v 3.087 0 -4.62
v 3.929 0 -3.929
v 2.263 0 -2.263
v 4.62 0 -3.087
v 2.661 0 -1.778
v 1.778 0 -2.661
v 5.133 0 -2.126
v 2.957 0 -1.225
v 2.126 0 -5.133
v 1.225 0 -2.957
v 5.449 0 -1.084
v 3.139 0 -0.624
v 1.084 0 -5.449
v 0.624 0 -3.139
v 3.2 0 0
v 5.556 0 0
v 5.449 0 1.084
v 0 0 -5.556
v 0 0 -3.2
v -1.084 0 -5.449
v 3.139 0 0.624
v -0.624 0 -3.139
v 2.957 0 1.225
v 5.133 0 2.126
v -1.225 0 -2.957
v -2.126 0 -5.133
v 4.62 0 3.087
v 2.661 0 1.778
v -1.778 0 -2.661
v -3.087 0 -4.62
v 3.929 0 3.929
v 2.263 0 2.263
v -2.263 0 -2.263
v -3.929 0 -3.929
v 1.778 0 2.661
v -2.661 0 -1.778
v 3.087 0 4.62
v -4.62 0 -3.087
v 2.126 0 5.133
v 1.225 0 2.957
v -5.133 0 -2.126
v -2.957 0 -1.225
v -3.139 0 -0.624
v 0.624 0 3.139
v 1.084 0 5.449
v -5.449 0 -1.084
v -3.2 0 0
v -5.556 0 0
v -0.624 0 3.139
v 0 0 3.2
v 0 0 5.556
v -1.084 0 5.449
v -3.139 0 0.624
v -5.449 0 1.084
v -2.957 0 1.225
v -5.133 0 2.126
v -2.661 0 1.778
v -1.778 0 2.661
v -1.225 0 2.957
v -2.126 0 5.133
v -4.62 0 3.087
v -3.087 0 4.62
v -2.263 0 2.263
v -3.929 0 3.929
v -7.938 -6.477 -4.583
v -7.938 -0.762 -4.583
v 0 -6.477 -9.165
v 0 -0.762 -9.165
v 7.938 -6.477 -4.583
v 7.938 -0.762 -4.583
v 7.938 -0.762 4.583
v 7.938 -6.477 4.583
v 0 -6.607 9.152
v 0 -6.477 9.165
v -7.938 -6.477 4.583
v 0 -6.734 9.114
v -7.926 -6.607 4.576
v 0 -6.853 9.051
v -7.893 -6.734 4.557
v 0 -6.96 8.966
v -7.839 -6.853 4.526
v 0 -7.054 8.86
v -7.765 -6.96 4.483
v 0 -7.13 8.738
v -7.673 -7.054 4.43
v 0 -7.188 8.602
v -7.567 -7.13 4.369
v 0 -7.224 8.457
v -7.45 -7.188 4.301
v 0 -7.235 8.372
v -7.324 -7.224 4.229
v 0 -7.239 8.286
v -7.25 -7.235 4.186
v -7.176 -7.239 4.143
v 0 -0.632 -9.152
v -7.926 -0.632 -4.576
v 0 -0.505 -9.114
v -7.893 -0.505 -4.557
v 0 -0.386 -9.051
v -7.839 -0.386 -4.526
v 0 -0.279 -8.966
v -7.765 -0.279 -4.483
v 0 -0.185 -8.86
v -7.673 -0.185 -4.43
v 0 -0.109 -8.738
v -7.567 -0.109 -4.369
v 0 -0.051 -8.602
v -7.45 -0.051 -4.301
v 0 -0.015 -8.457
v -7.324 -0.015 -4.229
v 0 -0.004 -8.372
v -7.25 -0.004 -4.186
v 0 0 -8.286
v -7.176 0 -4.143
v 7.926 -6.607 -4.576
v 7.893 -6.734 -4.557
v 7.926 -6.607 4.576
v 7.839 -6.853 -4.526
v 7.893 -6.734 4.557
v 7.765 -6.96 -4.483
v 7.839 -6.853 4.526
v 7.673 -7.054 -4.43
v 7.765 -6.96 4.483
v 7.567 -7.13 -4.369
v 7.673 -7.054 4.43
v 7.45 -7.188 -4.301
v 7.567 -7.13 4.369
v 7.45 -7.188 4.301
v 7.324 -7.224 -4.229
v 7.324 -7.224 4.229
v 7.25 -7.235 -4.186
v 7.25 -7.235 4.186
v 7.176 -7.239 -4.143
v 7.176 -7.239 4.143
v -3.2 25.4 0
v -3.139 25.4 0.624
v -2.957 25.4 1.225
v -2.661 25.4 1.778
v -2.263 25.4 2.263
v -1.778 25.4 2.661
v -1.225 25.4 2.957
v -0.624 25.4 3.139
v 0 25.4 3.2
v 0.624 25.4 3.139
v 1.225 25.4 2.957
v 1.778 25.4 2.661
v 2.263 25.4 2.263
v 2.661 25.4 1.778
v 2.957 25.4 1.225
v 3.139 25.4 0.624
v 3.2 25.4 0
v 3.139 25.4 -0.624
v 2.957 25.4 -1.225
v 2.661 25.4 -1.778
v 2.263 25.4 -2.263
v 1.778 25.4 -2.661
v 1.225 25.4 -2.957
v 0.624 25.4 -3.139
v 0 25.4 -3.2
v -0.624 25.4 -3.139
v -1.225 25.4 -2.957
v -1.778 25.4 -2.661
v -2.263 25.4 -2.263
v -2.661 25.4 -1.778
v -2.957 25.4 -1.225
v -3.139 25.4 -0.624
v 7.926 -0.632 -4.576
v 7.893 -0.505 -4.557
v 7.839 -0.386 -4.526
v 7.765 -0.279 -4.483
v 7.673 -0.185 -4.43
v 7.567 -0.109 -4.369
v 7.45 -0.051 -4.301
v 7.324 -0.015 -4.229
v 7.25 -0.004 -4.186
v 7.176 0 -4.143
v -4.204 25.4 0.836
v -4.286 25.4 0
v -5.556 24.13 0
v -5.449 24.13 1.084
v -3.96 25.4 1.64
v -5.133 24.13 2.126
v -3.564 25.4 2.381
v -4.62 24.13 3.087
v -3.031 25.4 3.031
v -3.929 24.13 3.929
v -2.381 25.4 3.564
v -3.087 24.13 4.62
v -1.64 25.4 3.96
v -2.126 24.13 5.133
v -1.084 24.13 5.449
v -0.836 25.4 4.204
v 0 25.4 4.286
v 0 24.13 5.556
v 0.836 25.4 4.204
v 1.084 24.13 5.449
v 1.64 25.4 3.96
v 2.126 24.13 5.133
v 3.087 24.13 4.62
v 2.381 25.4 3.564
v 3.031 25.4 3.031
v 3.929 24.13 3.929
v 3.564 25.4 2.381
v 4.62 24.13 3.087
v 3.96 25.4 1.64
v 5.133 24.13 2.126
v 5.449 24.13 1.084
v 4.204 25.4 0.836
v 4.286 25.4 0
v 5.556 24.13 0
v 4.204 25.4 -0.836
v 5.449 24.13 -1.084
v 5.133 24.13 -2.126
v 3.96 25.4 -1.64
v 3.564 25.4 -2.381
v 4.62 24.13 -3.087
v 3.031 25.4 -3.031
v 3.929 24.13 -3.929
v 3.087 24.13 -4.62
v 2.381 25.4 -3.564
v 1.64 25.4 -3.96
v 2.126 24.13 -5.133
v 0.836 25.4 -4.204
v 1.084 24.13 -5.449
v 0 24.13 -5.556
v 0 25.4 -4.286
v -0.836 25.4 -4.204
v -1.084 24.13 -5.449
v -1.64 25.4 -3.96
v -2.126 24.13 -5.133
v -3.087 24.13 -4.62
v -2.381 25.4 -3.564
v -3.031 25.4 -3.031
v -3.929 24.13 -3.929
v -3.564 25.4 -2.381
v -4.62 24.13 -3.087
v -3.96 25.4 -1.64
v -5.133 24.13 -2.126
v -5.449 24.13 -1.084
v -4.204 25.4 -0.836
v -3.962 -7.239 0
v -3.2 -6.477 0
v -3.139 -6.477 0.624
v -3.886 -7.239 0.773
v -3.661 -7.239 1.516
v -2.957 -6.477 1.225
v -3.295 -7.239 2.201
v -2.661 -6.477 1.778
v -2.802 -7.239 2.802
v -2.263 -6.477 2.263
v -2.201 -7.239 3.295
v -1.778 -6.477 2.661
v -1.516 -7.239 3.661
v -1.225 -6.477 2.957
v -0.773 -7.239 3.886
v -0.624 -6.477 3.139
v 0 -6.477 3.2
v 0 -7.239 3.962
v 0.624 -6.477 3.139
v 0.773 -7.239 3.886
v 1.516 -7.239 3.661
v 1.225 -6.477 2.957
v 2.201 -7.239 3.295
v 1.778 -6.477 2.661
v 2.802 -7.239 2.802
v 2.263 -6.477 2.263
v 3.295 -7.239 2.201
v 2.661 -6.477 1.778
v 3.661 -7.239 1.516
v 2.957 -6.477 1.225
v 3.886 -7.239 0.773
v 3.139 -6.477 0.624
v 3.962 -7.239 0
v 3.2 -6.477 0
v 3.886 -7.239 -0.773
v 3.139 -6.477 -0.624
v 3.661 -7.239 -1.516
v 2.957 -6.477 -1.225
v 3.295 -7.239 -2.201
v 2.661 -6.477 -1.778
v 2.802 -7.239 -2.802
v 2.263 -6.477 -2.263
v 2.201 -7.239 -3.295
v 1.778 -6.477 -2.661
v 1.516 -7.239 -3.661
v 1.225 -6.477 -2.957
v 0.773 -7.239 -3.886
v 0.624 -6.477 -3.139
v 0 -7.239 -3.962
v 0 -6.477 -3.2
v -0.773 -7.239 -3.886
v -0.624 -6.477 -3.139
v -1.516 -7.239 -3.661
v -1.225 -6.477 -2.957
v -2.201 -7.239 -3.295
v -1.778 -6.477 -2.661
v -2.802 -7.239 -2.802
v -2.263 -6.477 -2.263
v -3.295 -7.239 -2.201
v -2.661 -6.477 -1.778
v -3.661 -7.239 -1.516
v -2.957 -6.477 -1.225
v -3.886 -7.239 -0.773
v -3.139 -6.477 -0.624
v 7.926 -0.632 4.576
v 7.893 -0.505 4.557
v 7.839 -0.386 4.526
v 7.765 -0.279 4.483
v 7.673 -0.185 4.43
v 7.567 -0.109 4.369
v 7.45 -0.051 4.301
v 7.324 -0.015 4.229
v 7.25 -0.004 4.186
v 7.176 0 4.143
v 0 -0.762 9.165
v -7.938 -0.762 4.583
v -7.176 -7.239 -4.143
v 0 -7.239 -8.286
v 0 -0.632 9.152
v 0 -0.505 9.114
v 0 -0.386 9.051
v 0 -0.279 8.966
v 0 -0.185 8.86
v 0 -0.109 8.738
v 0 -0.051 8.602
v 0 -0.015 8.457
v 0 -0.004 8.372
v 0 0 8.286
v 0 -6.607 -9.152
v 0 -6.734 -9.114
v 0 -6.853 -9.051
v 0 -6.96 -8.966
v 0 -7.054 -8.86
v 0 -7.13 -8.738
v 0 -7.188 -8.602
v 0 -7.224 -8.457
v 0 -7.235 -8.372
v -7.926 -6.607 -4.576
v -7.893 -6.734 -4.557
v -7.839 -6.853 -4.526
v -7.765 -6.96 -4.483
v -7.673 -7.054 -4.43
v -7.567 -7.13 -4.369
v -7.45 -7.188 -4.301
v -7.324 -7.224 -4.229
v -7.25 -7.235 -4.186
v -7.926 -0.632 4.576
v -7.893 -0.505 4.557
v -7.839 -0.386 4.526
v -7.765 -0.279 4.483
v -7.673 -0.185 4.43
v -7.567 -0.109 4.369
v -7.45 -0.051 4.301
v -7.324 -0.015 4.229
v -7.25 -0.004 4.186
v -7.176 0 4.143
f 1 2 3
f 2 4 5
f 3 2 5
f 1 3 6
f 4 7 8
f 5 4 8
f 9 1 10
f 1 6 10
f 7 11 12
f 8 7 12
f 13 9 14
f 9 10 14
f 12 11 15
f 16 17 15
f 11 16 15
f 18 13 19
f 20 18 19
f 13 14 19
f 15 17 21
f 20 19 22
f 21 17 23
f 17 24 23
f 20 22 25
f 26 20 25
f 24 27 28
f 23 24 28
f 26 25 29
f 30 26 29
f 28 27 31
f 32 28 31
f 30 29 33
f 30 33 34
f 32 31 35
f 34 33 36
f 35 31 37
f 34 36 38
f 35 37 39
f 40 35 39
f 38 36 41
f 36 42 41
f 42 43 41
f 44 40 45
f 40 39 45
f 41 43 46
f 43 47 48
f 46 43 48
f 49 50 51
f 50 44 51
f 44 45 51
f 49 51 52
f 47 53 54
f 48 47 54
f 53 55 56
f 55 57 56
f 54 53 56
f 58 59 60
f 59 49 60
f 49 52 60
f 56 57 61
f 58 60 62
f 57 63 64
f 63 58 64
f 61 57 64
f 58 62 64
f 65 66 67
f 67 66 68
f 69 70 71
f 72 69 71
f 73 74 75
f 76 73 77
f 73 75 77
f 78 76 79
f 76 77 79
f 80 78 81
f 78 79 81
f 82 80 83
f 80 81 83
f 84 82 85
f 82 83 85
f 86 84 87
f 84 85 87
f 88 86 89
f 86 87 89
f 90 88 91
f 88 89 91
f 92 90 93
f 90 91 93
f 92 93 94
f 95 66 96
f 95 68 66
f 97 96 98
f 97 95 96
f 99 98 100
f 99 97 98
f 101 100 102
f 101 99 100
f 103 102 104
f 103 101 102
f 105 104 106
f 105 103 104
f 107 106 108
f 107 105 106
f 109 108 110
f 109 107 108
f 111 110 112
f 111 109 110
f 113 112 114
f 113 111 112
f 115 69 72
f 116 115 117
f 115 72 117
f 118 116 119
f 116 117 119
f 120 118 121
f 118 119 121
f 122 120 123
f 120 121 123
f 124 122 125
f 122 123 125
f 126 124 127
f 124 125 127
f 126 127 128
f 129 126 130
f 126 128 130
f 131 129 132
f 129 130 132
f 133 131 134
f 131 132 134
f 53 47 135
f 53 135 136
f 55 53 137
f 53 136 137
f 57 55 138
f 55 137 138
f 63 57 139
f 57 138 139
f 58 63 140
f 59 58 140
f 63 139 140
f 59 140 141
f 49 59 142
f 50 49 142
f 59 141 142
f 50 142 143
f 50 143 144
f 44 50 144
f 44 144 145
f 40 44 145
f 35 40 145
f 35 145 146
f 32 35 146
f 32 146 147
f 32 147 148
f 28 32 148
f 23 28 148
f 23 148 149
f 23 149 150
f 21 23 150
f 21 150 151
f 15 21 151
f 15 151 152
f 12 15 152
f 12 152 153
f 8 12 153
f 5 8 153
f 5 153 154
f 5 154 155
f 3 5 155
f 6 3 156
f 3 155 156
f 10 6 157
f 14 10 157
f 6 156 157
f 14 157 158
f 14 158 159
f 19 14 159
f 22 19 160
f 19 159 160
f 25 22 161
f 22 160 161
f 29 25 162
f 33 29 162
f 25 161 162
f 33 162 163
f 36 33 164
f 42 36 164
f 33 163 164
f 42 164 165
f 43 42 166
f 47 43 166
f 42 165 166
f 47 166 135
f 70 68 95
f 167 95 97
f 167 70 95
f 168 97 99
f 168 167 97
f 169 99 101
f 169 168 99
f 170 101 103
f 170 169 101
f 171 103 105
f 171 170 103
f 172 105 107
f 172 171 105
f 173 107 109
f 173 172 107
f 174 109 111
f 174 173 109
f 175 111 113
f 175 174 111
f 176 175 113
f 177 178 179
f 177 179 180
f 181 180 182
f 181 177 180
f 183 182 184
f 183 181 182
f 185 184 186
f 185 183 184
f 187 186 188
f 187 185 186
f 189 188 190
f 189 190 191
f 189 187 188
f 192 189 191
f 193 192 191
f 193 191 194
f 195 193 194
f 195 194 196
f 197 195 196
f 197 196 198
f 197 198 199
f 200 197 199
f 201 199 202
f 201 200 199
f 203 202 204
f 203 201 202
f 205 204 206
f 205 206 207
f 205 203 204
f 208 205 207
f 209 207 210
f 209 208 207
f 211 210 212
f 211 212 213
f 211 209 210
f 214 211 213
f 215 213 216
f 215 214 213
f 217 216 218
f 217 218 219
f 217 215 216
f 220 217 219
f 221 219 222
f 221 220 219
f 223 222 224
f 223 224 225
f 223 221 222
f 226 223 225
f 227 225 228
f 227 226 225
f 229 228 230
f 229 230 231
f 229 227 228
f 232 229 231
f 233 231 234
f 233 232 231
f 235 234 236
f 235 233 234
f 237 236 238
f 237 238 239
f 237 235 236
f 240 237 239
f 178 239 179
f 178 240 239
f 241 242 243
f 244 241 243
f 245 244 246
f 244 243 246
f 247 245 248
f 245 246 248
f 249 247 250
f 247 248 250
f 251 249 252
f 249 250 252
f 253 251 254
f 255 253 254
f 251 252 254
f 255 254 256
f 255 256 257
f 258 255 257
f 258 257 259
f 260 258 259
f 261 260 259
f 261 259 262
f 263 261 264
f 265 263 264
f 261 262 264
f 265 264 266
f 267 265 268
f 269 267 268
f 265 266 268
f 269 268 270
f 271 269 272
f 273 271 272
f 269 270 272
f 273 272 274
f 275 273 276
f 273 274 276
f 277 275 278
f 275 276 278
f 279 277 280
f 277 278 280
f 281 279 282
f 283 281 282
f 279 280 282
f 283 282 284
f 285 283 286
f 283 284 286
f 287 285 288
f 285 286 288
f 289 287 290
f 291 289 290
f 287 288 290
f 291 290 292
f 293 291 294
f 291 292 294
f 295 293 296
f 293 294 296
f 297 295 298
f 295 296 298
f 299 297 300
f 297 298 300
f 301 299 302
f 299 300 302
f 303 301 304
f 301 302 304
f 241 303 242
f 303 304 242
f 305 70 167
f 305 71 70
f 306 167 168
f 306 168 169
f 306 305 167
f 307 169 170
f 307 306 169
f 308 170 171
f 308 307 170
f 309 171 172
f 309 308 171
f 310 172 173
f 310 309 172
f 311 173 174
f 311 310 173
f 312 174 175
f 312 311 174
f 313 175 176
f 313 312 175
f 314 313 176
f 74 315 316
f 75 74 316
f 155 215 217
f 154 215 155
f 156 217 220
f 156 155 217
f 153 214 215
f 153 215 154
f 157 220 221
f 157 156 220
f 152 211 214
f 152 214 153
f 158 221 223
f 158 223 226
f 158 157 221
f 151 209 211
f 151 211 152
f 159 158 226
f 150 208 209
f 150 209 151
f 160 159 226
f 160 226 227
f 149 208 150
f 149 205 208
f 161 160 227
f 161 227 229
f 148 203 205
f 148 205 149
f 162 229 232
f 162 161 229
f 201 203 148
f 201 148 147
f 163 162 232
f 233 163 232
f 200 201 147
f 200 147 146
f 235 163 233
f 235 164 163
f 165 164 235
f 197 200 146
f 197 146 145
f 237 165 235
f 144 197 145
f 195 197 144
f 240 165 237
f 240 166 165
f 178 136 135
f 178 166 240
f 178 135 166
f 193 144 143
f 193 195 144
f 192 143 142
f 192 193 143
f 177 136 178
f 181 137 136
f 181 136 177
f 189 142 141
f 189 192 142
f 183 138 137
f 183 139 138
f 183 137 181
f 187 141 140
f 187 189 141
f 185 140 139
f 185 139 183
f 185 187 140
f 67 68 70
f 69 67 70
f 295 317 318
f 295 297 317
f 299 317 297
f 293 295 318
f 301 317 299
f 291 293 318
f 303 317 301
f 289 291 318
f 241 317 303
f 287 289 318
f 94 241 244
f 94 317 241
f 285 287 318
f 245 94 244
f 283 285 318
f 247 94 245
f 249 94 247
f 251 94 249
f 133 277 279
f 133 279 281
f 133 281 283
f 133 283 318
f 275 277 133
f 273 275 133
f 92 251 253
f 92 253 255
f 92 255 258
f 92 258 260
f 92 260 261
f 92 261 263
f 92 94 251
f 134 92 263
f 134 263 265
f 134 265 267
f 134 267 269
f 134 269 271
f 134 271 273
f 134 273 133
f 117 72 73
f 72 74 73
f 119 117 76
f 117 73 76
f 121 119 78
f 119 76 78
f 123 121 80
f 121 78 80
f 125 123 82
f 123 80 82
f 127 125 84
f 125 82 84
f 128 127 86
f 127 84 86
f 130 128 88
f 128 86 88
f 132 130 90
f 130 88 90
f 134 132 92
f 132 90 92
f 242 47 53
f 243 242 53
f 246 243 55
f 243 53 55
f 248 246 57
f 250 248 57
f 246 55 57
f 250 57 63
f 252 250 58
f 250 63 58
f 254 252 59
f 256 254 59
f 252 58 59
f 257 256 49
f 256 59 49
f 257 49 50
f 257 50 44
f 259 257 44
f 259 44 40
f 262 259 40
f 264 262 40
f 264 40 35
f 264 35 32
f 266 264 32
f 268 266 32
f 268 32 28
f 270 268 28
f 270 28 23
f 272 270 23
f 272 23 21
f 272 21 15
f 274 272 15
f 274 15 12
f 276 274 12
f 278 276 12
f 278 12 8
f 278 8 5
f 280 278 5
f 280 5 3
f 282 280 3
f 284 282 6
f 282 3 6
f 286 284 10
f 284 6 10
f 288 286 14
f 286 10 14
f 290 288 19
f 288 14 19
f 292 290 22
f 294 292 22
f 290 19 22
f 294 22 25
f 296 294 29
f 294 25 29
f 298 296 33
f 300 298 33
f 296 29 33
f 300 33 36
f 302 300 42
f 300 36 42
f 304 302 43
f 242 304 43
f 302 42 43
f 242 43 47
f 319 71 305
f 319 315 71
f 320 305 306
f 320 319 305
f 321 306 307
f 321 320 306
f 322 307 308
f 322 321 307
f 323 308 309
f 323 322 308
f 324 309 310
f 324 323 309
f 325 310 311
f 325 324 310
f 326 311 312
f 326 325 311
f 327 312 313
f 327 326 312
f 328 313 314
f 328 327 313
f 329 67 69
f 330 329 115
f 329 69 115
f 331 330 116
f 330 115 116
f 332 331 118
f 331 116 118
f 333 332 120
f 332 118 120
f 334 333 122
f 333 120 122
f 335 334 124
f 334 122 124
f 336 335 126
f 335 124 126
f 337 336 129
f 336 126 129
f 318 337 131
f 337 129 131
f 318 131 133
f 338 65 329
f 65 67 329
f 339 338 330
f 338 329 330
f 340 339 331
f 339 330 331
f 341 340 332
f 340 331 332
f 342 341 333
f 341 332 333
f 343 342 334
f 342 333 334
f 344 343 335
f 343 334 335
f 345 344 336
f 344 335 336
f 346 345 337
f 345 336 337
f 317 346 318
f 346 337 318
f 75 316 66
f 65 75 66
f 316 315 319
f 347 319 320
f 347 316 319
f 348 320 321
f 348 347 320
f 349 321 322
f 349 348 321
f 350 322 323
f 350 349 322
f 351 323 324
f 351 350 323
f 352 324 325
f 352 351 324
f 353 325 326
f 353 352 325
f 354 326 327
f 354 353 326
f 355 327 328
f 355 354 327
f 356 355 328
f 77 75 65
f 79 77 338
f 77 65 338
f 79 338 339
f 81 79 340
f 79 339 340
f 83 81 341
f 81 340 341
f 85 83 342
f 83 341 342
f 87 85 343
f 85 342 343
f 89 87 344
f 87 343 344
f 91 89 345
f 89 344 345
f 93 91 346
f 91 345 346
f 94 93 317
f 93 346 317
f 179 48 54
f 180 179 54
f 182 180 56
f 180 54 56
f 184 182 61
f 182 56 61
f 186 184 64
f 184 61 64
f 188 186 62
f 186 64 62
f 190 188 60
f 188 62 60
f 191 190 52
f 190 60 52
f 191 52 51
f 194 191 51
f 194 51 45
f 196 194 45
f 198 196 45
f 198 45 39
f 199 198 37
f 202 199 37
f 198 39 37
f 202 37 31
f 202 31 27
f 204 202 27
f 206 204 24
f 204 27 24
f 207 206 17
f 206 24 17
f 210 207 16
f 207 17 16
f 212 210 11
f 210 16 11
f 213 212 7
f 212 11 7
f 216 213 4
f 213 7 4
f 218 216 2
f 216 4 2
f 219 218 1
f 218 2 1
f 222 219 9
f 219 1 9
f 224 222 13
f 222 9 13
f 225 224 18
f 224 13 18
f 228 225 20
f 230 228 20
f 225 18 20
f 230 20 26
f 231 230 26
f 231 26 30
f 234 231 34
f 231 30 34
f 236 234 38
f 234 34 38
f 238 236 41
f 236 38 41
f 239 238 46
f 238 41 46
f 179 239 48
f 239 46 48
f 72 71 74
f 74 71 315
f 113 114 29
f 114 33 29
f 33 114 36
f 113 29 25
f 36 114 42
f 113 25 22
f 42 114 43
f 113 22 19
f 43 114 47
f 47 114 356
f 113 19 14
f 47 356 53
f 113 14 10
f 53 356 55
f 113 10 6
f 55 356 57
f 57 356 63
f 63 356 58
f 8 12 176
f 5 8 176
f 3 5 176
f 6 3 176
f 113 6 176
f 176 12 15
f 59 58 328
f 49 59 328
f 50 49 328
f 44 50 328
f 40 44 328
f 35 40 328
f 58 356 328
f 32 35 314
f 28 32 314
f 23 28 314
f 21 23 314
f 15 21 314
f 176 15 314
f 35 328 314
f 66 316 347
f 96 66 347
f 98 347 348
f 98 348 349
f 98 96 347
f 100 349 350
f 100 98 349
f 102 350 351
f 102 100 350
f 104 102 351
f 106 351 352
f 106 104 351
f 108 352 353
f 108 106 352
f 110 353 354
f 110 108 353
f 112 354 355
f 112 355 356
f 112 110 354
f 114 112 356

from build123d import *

# Parameters (mm, degrees)
F1_DEPTH = 7.239
F2_R     = 0.762
F3_R     = 5.55625
F4_DEPTH = 25.4
F5_SIZE  = 1.27
F6_R     = 3.2004
F7_DEPTH = 50.8
F8_SIZE  = 0.762


with BuildPart() as f1:
    # F0 (on Front) → F1 (new body)
    with BuildSketch(Plane.XZ):
        Polygon((-7.9375, 4.582718), (-7.9375, -4.582718), (0, -9.165436), (7.9375, -4.582718), (7.9375, 4.582718), (0, 9.165436), align=None)
    extrude(amount=F1_DEPTH)

    # F2
    f2_edges = [f1.edges().sort_by_distance(p)[0] for p in [
        (-3.96875, -7.239, 6.874077),
        (-7.9375, -7.239, 0),
        (-3.96875, -7.239, -6.874077),
        (3.96875, -7.239, -6.874077),
        (7.9375, -7.239, 0),
        (3.96875, -7.239, 6.874077),
        (-3.96875, 0, 6.874077),
        (-7.9375, 0, 0),
        (-3.96875, 0, -6.874077),
        (3.96875, 0, -6.874077),
        (7.9375, 0, 0),
        (3.96875, 0, 6.874077),
    ]]
    fillet(f2_edges, radius=F2_R)


with BuildPart() as f4:
    # F3 (on face) → F4 (new body)
    with BuildSketch(Plane(origin=(0, 0, 0), x_dir=(-1, 0, 0), z_dir=(0, 1, 0))):
        Circle(F3_R)
    extrude(amount=F4_DEPTH)

    # F5
    f5_edges = [f4.edges().sort_by_distance(p)[0] for p in [
        (5.55625, 25.4, 0),
    ]]
    chamfer(f5_edges, length=F5_SIZE)


with BuildPart() as f7_tool:
    # F6 (on face) → F7 (new body)
    with BuildSketch(Plane(origin=(0, 25.4, 0), x_dir=(-1, 0, 0), z_dir=(0, 1, 0))):
        Circle(F6_R)
    extrude(amount=-F7_DEPTH)


with BuildPart() as f1_1:
    add(f1.part)

    # F7: cut by f7_tool
    add(f7_tool.part, mode=Mode.SUBTRACT)

    # F8
    f8_edges = [f1_1.edges().sort_by_distance(p)[0] for p in [
        (3.2004, -7.239, 0),
    ]]
    chamfer(f8_edges, length=F8_SIZE)


with BuildPart() as f4_1:
    add(f4.part)

    # F7: cut by f7_tool
    add(f7_tool.part, mode=Mode.SUBTRACT)


solid = Compound([f1_1.part, f4_1.part])
